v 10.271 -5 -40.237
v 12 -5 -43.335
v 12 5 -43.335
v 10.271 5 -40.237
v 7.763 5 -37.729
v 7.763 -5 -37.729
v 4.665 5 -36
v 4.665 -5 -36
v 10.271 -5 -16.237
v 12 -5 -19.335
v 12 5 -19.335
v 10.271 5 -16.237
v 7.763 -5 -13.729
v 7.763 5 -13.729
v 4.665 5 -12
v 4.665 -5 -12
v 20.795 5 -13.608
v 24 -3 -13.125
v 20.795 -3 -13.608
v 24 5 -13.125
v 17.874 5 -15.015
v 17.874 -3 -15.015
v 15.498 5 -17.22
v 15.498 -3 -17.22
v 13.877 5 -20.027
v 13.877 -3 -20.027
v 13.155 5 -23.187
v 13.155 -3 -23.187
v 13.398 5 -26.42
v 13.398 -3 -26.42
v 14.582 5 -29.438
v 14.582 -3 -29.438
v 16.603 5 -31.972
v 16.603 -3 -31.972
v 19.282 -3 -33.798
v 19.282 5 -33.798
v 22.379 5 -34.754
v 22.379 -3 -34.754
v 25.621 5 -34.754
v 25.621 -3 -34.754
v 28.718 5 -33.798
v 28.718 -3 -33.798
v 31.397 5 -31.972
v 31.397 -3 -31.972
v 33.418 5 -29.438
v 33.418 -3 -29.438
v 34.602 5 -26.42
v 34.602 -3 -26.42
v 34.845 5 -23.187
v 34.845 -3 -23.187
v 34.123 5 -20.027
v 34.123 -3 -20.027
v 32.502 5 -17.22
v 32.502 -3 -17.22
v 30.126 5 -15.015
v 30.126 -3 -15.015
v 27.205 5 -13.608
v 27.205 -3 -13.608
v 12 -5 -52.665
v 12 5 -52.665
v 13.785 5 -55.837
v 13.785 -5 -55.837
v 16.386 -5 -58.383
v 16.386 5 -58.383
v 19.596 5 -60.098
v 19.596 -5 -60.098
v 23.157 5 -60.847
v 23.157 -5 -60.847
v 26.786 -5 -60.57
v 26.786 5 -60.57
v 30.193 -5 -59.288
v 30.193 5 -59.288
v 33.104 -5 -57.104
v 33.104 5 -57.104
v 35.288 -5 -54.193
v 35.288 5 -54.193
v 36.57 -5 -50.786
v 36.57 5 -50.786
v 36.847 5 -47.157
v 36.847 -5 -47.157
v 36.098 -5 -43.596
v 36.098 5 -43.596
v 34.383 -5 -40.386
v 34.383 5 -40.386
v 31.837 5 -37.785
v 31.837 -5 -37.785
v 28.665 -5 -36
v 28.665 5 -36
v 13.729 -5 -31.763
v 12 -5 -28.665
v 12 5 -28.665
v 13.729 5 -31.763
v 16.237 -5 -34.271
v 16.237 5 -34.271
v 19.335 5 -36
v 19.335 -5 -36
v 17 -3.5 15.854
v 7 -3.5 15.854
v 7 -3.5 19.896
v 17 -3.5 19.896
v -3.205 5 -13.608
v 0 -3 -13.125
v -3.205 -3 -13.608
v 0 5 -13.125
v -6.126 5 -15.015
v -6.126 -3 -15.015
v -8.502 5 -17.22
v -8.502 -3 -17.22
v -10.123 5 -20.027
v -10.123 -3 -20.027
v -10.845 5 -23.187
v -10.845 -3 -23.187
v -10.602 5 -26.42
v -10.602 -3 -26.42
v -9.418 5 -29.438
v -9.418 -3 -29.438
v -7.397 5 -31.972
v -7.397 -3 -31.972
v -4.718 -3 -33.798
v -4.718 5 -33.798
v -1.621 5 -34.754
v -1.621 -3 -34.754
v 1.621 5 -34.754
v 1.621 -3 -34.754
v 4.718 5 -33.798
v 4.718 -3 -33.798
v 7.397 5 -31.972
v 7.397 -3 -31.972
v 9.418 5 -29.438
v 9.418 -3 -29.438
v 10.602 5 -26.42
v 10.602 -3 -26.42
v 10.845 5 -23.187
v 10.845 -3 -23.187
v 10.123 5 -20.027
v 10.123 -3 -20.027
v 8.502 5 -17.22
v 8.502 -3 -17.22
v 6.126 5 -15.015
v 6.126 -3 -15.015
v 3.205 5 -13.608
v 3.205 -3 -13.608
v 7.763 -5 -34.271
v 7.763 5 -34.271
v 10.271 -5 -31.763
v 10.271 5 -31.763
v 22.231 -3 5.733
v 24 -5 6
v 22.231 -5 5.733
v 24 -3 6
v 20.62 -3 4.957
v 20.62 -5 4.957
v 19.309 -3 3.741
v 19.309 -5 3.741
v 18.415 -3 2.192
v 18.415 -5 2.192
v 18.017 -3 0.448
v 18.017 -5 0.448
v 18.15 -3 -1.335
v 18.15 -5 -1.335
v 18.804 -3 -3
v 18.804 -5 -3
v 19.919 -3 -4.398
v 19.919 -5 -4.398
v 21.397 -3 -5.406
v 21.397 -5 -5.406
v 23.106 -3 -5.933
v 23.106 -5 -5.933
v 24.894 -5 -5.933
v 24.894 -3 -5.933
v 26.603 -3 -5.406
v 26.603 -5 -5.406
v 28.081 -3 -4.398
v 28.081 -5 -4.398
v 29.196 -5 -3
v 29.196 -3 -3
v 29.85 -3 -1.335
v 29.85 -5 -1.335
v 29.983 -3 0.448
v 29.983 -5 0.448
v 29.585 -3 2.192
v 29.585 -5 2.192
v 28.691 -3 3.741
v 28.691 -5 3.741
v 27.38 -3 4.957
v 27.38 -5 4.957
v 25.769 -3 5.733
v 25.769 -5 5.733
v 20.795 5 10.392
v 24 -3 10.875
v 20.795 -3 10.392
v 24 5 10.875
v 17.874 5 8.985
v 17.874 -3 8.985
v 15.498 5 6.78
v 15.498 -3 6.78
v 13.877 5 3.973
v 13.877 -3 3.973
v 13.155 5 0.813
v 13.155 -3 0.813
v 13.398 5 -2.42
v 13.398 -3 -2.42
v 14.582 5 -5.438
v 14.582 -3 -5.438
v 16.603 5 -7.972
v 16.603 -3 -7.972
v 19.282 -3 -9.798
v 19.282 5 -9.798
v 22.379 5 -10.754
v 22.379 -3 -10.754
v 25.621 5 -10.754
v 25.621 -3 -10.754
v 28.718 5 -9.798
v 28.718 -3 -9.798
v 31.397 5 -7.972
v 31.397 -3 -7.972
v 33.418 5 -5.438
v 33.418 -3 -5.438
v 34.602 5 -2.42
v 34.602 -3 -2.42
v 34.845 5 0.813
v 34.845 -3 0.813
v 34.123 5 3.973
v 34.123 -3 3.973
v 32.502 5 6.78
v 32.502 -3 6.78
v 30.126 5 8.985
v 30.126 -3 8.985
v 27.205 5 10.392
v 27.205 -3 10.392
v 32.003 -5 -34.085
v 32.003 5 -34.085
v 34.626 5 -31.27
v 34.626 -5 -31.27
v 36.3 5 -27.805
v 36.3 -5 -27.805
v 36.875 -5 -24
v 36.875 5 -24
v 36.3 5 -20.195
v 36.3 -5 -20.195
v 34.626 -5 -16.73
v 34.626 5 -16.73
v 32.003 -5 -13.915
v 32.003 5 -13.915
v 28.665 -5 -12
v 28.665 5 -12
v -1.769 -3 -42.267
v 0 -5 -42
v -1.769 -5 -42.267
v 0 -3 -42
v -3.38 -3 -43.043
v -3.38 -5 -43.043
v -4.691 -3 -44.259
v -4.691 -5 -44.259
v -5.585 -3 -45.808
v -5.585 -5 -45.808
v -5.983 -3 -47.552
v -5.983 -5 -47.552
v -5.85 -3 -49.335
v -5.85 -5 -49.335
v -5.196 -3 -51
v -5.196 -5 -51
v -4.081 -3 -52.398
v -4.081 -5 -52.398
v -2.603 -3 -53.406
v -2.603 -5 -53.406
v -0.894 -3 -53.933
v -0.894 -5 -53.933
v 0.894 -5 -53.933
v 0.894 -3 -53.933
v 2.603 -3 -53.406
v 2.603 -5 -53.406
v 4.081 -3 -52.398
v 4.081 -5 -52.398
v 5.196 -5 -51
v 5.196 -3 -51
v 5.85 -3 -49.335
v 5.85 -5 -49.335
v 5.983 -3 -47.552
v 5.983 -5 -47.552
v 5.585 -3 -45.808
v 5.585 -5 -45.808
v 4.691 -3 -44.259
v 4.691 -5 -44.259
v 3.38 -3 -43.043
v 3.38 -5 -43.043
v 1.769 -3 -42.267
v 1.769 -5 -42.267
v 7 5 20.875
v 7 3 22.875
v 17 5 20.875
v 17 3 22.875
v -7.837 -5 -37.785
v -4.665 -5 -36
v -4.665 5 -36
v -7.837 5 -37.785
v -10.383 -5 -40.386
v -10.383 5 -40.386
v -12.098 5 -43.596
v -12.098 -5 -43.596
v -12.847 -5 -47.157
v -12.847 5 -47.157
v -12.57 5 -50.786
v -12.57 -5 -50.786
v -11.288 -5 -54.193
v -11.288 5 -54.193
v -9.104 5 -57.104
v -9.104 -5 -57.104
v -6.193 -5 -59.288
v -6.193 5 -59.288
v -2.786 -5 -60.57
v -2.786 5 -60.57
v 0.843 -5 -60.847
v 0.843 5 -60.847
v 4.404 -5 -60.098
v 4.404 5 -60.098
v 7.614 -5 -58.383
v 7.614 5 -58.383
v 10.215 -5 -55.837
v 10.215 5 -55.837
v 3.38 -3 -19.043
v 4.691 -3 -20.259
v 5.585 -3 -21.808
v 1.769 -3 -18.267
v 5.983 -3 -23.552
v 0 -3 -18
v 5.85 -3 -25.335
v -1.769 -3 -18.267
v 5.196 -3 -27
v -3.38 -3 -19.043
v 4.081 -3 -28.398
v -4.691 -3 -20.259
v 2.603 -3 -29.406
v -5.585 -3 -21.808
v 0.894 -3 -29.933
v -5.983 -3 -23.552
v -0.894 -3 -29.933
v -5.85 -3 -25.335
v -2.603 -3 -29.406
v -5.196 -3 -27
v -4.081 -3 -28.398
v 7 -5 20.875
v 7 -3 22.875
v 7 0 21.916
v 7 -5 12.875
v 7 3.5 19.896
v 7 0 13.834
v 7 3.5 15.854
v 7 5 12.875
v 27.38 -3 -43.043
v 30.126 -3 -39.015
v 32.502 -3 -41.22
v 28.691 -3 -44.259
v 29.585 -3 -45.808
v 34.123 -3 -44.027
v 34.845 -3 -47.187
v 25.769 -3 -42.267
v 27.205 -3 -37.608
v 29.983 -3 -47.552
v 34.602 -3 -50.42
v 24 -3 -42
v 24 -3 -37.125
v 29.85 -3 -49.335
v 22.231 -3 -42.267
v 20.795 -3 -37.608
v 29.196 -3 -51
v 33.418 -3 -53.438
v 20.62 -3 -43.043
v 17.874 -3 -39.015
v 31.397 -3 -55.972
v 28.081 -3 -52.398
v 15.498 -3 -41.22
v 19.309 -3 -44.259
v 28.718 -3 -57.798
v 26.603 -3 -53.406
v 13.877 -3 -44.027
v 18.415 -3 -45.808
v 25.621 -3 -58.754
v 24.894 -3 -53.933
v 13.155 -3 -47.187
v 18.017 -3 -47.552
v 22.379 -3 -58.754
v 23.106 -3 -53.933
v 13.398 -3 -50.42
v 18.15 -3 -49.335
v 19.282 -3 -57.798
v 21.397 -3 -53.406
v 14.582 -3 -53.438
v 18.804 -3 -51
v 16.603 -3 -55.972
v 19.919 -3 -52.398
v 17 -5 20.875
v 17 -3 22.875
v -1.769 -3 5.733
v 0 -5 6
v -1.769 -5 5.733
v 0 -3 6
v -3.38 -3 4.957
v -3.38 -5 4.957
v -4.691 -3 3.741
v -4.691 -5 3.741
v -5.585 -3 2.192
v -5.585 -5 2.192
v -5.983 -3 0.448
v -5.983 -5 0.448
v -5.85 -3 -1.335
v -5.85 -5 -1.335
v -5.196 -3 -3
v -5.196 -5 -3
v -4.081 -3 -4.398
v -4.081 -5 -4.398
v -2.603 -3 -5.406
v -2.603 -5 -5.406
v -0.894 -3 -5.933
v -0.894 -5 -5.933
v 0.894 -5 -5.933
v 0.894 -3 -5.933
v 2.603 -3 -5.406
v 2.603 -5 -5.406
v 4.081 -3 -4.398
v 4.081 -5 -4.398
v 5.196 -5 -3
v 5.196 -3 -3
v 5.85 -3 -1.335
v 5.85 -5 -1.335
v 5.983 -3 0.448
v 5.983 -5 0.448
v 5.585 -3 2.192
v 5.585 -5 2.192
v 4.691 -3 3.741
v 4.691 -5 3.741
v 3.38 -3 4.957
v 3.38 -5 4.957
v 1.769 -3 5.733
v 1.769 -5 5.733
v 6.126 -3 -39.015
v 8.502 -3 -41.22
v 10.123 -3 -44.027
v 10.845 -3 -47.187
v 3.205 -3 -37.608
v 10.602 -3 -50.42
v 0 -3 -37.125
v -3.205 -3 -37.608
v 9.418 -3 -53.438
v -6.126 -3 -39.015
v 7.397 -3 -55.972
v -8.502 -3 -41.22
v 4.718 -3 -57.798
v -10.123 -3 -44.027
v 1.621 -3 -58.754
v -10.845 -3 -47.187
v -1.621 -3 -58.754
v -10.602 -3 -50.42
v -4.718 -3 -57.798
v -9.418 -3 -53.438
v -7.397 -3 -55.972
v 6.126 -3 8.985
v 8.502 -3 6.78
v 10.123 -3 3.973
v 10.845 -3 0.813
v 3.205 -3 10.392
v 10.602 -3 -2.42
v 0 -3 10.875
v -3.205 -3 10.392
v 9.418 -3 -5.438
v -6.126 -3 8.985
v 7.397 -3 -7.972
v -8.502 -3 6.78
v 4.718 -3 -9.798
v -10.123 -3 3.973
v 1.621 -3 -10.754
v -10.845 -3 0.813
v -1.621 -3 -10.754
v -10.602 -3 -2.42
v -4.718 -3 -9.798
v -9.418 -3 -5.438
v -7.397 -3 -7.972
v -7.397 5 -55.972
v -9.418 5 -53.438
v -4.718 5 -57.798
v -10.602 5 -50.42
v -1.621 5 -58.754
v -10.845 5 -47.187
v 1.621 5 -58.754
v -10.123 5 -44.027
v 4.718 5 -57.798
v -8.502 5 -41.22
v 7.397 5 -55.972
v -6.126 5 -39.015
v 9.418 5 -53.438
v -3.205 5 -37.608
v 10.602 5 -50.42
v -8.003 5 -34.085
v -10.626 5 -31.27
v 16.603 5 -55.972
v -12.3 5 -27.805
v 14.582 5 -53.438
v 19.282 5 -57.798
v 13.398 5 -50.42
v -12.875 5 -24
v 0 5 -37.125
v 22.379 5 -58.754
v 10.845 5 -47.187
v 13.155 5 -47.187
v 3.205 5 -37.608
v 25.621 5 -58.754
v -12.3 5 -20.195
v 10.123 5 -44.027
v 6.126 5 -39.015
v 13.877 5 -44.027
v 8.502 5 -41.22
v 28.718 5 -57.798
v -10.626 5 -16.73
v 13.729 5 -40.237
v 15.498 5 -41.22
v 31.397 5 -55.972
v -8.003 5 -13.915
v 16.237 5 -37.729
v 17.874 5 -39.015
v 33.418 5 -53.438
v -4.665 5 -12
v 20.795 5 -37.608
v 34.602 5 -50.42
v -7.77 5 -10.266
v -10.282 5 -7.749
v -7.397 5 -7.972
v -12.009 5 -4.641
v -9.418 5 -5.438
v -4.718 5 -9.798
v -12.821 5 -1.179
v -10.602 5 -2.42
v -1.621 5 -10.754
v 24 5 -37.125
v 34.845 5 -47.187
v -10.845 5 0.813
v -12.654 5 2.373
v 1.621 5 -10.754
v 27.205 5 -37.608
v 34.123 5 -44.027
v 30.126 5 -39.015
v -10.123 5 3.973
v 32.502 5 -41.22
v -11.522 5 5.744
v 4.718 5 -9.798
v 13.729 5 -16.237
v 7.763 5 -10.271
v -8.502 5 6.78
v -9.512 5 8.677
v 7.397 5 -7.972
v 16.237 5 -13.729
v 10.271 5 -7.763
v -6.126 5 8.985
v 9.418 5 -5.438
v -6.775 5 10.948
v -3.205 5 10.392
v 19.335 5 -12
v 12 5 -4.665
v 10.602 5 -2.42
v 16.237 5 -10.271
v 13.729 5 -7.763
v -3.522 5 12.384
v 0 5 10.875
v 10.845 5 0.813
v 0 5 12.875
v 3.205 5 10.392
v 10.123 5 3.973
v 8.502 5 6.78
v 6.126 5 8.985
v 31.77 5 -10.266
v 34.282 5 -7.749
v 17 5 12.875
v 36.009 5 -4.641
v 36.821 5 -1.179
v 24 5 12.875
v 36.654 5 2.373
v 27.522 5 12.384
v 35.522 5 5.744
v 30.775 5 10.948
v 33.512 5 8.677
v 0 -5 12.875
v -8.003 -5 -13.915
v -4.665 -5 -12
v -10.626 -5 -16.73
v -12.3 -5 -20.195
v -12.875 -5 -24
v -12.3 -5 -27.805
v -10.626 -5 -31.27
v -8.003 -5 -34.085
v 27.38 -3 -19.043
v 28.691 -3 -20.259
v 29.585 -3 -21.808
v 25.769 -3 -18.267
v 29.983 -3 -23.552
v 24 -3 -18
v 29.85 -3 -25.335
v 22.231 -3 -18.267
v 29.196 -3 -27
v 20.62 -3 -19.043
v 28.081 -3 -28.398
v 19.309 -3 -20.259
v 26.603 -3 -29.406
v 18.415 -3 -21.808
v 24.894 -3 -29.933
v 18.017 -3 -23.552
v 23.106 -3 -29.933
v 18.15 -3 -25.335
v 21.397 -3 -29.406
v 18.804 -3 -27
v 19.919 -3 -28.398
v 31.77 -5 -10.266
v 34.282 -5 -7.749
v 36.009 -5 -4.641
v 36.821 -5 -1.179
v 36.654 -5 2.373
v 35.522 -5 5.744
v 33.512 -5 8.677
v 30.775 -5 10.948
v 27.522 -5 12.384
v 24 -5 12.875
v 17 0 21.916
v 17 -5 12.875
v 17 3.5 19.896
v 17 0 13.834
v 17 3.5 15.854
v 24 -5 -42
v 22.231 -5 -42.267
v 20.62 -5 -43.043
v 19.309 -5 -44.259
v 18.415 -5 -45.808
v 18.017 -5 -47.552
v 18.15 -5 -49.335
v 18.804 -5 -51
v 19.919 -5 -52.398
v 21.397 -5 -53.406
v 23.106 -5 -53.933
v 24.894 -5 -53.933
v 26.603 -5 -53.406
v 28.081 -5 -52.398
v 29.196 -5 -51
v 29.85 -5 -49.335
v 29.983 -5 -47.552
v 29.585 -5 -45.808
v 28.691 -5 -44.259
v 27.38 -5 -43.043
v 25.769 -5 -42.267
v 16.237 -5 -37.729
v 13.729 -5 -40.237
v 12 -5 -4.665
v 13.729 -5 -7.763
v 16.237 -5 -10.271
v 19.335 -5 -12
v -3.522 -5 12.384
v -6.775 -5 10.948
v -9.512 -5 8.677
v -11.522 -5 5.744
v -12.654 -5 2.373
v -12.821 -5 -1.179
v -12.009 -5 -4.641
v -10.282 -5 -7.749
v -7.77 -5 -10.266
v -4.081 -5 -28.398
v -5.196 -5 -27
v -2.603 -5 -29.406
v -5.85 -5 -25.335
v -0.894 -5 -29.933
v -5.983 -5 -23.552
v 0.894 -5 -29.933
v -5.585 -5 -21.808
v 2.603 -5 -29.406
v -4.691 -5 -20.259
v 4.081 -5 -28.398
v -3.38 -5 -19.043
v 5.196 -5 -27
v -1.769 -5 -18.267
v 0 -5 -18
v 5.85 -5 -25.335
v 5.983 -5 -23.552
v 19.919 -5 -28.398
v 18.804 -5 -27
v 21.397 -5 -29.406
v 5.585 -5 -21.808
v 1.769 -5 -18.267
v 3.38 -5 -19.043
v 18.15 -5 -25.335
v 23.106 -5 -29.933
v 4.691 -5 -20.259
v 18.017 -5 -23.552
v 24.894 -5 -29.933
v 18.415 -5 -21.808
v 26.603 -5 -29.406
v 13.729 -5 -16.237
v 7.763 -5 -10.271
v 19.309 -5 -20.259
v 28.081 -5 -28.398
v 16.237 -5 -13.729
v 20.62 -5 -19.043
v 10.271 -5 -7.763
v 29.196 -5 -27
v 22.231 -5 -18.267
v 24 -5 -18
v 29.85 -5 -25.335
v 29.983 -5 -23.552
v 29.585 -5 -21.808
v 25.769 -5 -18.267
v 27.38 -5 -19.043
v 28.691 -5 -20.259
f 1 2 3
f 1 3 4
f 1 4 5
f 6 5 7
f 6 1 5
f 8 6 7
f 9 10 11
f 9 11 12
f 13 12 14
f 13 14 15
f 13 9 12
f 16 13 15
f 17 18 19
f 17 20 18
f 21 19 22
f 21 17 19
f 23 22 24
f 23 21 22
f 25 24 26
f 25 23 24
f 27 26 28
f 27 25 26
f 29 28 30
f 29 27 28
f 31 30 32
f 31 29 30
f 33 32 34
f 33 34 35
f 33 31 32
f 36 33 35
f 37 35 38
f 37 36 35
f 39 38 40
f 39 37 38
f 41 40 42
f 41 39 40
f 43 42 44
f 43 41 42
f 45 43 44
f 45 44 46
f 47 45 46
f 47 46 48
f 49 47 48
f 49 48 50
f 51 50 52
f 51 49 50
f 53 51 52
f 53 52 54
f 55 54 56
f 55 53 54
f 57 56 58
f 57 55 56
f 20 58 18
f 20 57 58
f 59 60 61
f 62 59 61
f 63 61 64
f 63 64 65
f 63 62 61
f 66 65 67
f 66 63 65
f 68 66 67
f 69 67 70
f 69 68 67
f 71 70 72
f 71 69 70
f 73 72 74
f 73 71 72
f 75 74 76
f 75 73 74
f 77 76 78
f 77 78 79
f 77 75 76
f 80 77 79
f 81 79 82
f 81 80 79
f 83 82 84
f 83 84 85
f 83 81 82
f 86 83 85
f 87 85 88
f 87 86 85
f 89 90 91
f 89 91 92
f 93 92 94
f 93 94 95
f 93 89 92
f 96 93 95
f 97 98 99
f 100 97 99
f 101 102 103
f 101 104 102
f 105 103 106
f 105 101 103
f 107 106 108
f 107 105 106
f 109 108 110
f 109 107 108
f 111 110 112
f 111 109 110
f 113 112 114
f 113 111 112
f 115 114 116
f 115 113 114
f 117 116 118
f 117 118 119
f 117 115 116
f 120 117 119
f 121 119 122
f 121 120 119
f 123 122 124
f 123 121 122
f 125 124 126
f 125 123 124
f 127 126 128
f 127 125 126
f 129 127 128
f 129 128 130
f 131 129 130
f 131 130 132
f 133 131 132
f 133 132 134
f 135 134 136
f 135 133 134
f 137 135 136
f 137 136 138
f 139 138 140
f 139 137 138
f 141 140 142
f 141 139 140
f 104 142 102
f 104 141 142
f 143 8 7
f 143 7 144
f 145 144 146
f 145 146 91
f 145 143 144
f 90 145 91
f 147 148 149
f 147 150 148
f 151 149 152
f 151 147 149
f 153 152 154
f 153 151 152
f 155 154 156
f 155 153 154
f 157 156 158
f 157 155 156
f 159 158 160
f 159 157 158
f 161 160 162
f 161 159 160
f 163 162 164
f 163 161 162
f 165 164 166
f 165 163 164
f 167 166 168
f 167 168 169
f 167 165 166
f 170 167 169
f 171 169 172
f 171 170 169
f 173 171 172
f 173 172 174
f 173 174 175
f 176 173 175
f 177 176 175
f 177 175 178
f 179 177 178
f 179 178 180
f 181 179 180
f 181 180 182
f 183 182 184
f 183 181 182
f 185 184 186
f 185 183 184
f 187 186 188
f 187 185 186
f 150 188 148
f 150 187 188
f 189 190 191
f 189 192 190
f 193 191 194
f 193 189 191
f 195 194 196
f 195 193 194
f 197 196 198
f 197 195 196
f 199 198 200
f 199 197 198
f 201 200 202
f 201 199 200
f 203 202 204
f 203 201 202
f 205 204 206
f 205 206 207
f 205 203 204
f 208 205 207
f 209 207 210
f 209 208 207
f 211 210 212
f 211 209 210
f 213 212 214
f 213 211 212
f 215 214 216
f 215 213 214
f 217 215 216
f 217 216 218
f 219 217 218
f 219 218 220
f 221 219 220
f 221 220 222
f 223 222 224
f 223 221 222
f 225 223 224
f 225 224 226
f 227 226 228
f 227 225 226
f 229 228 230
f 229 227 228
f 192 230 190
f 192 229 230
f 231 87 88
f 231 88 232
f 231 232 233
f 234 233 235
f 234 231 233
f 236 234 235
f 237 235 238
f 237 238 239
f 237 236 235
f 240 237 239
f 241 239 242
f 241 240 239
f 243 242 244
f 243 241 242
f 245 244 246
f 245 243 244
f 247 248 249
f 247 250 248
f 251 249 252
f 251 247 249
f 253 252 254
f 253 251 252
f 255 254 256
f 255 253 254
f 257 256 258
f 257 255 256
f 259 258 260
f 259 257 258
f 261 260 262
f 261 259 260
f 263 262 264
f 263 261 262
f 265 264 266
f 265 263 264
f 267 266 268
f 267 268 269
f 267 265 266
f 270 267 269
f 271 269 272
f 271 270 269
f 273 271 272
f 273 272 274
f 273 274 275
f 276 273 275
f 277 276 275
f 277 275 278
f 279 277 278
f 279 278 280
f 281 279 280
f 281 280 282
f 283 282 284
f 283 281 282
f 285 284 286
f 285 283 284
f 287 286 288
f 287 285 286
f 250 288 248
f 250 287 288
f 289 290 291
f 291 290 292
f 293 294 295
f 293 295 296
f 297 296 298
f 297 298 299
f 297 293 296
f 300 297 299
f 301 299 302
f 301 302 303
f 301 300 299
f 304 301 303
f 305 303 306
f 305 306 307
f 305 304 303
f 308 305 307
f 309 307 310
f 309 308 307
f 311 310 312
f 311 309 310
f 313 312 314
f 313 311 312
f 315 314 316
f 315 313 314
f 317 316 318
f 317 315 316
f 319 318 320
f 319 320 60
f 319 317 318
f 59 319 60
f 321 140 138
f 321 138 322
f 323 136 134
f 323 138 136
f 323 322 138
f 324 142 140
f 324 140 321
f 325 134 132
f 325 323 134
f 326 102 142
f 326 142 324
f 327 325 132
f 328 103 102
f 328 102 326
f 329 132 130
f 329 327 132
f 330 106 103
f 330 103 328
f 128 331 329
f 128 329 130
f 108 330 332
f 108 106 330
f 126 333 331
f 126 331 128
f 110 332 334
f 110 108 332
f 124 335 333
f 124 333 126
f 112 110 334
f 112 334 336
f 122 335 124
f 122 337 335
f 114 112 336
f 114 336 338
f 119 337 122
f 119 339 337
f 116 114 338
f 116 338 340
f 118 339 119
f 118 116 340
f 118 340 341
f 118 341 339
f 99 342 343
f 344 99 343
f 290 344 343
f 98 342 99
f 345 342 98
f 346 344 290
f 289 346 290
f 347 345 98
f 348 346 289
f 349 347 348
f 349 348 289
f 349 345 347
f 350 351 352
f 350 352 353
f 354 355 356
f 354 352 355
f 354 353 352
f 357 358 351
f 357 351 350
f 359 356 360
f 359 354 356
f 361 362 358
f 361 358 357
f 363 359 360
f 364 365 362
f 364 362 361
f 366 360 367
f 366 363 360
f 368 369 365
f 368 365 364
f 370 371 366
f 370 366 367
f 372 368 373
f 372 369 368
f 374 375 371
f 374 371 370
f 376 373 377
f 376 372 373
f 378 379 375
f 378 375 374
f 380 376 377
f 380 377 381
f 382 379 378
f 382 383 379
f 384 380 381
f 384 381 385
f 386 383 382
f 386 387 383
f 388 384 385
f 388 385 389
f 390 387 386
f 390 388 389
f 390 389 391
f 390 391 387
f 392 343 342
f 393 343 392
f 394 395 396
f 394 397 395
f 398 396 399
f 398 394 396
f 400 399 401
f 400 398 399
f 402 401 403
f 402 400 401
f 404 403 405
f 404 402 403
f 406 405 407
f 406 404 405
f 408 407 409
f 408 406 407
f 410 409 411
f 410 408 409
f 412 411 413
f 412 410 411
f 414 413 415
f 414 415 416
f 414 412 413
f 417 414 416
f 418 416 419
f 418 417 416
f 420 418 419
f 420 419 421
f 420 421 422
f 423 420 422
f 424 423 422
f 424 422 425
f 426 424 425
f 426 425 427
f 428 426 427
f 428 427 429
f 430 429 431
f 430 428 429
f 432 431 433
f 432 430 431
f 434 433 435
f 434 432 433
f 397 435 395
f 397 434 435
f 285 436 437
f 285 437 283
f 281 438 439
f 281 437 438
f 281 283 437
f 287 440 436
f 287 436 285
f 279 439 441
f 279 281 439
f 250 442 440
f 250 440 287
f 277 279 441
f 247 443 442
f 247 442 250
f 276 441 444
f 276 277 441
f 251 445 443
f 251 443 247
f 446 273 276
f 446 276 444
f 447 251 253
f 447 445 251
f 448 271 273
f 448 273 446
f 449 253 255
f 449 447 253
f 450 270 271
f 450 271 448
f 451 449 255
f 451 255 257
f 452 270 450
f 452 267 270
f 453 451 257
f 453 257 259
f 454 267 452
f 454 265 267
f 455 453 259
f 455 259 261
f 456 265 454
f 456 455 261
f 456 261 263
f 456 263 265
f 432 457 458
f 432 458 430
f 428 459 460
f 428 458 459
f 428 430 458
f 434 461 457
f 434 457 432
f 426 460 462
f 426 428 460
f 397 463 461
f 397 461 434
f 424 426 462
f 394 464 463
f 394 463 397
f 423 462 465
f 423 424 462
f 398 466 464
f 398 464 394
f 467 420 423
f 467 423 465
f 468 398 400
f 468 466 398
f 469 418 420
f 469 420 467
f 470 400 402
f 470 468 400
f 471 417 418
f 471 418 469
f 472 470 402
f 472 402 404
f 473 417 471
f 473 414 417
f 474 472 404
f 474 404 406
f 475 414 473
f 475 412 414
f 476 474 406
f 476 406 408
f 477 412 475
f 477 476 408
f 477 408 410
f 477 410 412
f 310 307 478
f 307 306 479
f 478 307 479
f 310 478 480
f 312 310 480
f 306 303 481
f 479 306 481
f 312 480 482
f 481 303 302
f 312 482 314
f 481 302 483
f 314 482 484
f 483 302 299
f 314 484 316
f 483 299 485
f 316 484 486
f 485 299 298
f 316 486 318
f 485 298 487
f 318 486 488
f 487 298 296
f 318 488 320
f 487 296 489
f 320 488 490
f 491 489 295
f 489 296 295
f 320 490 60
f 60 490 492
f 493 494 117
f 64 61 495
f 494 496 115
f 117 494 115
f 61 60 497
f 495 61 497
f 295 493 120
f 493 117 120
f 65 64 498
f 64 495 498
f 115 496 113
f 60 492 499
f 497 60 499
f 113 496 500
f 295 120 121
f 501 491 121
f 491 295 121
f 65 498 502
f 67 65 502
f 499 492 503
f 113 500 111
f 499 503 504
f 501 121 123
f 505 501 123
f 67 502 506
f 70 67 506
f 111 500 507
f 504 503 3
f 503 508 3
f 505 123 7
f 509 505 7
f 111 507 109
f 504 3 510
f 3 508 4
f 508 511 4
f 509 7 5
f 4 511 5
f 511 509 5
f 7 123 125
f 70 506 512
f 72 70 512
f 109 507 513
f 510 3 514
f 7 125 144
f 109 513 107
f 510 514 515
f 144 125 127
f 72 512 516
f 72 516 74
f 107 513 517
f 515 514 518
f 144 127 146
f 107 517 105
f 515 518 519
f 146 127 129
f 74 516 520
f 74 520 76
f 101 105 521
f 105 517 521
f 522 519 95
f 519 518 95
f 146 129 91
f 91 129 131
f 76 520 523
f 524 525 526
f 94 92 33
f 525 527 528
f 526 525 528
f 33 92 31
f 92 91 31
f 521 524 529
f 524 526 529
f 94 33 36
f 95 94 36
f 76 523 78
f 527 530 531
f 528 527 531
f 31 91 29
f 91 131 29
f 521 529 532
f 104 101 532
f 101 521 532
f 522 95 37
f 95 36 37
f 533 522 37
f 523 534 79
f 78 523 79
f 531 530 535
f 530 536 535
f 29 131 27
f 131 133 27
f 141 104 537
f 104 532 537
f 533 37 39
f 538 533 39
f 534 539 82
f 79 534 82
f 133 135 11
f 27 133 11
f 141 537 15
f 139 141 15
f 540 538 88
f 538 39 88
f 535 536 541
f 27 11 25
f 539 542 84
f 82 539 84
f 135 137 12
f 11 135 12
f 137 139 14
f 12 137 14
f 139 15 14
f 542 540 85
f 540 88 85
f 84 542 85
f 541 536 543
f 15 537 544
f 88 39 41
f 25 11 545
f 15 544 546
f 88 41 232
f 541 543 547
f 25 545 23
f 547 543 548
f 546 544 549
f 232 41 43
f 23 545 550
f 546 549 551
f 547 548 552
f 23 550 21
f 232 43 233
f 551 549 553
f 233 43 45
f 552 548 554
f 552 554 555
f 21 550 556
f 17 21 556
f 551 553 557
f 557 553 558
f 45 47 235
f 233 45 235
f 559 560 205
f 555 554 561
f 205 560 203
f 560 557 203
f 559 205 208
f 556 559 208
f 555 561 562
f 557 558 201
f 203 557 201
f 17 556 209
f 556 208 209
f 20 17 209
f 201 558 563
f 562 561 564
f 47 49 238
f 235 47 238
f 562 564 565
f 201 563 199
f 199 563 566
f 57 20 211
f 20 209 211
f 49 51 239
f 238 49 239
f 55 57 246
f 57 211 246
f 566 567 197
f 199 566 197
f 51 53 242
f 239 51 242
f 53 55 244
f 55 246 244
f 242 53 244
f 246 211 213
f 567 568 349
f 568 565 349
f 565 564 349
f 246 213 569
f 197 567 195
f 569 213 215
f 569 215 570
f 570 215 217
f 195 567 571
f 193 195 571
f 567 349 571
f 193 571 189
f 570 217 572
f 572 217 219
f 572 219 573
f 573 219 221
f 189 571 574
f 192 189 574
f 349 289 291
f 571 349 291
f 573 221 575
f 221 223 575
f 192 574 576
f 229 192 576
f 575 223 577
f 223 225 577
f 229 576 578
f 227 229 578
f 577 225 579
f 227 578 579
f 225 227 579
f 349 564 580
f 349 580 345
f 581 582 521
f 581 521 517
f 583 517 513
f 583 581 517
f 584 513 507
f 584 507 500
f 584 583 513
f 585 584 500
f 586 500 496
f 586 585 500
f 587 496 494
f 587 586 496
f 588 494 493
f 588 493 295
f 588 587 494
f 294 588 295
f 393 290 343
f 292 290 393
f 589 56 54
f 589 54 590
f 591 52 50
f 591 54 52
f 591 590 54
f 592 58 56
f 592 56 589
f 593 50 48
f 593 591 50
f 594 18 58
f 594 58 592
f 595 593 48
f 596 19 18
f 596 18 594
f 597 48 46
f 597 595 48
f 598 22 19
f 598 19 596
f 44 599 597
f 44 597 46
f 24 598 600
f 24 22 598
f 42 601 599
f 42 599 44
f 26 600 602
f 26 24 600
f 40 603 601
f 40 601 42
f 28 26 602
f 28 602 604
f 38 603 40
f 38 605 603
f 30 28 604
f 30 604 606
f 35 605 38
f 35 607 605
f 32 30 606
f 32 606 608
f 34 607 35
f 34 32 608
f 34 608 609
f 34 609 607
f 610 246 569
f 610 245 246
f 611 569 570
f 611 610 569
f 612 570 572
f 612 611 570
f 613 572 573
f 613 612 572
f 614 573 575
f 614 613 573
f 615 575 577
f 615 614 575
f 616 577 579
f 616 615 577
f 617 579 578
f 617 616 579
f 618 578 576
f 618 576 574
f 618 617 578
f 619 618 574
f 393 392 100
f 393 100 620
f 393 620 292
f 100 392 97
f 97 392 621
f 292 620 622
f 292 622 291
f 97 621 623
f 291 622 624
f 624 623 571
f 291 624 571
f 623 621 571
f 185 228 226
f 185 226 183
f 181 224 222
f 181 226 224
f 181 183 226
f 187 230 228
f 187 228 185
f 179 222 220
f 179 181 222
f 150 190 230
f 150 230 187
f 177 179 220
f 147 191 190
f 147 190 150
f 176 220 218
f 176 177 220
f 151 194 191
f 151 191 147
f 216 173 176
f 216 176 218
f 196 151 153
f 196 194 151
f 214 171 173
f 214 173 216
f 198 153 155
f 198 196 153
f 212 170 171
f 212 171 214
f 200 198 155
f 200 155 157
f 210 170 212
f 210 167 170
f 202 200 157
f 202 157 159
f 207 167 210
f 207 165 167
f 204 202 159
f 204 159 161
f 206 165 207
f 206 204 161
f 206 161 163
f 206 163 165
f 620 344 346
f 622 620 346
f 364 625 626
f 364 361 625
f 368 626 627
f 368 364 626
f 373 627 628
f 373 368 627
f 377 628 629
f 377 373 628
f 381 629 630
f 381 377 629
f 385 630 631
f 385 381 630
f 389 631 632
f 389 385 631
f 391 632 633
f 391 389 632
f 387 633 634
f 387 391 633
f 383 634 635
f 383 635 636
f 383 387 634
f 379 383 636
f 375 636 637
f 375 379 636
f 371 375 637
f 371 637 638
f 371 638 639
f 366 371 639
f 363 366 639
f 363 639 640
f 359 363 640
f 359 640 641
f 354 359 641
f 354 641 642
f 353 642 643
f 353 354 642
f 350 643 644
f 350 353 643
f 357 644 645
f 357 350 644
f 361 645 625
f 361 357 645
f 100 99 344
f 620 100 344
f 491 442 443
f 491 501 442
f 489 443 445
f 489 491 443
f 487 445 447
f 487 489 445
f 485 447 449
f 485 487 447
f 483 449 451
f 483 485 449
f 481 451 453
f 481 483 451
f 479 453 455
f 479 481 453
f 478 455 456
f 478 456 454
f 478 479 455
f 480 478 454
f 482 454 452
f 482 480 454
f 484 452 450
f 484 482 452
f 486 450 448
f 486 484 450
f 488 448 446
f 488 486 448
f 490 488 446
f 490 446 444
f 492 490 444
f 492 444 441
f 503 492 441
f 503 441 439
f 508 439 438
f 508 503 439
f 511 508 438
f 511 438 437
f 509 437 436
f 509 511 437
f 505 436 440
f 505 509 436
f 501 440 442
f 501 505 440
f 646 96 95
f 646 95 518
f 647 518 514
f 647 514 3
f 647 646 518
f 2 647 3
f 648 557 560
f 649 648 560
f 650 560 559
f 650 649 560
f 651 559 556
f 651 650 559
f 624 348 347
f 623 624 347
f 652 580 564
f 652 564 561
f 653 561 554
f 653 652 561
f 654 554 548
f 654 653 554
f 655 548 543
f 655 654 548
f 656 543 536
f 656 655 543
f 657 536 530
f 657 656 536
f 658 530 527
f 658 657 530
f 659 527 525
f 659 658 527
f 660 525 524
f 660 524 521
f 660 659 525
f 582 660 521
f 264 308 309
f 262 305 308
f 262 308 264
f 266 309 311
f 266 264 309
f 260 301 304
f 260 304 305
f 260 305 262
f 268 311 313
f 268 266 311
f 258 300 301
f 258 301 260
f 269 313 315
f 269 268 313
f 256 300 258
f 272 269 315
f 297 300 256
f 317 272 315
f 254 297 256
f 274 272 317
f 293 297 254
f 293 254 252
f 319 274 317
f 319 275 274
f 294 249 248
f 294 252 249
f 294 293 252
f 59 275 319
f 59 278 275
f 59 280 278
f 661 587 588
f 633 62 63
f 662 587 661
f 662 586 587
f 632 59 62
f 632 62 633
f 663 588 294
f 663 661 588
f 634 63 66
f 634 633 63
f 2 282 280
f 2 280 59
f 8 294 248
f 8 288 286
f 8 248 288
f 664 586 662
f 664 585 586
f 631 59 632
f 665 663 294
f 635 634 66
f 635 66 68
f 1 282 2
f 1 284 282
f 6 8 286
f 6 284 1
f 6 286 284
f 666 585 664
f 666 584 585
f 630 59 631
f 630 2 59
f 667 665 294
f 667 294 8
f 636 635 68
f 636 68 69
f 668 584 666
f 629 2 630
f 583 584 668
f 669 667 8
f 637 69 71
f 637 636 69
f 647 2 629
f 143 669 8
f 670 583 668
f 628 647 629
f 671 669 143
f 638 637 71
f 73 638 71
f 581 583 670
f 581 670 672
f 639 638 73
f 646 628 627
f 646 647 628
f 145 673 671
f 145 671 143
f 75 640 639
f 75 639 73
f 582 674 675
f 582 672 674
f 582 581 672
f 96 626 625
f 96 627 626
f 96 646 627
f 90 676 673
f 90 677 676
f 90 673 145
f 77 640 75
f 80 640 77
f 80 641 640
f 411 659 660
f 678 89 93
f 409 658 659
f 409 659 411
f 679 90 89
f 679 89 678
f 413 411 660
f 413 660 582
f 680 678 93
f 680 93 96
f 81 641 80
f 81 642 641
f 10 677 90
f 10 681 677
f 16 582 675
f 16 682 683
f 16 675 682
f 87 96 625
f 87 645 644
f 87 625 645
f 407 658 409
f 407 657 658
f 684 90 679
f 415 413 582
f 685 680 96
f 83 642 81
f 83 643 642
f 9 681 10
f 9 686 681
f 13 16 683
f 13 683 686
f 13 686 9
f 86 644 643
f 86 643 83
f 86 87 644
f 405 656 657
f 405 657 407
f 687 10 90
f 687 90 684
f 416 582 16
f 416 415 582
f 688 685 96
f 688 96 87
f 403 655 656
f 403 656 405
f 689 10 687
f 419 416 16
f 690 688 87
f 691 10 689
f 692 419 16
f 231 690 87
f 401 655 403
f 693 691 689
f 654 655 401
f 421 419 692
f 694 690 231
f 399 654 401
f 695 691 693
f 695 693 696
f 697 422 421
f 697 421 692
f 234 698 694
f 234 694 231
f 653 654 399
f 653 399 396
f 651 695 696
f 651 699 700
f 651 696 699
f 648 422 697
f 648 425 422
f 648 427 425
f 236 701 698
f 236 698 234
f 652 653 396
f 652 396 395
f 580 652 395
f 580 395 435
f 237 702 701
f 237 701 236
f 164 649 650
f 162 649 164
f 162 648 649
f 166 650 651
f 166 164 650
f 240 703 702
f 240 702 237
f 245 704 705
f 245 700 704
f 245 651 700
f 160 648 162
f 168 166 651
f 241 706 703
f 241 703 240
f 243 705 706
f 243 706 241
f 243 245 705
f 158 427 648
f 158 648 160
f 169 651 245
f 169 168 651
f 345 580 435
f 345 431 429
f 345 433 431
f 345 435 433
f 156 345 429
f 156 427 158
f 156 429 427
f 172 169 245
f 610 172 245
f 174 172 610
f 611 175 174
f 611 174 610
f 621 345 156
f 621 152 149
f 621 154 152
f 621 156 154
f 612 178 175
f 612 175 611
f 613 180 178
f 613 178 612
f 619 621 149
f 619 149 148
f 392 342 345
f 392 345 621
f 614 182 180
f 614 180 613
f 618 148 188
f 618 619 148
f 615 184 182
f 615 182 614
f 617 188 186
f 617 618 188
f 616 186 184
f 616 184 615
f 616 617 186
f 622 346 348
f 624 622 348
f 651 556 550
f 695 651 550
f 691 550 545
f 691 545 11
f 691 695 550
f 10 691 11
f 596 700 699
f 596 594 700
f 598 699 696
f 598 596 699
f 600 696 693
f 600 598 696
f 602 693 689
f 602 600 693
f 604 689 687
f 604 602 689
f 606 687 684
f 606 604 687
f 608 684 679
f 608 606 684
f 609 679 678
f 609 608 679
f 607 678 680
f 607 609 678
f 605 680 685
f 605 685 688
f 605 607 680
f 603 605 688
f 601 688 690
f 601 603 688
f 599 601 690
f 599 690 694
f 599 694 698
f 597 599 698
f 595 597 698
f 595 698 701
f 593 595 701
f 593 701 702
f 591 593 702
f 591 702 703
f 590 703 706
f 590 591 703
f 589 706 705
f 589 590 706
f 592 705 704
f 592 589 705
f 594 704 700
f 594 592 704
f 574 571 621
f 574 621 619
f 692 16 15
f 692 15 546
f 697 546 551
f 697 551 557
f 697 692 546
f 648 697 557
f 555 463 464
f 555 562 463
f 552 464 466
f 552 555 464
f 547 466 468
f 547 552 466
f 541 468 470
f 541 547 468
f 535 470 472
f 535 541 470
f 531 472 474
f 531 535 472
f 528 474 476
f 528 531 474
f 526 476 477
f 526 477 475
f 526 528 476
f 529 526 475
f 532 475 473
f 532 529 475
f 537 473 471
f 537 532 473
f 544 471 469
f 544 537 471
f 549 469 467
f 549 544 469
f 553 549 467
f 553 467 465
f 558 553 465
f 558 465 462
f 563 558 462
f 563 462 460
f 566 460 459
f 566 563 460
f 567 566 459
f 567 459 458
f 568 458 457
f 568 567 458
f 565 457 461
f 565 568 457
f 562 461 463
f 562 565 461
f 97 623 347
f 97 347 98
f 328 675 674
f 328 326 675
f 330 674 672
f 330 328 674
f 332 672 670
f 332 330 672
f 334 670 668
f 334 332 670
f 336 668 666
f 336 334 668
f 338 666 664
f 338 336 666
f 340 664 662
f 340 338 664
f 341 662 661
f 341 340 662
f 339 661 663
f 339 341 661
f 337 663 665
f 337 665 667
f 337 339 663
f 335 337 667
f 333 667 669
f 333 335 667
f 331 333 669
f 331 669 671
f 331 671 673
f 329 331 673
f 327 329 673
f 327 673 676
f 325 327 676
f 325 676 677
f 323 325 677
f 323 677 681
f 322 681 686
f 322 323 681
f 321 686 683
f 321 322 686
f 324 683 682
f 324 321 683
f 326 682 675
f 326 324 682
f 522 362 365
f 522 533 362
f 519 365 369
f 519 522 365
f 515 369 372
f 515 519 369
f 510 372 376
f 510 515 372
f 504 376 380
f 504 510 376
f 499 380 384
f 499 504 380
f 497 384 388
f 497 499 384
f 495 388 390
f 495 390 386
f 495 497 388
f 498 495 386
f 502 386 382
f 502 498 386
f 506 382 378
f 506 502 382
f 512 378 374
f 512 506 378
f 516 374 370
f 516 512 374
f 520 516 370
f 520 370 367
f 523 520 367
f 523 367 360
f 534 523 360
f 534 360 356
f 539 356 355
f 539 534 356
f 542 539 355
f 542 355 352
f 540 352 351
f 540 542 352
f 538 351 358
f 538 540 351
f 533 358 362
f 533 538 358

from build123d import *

# Parameters (mm, degrees)
LPATTERN1_COUNT     = 3
LPATTERN1_PITCH     = 24
LPATTERN2_COUNT     = 2
LPATTERN2_PITCH     = 24
BOSS_EXTRUDE1_REACH = 84.606
SKETCH4_W           = 24
SKETCH4_H           = 10
SKETCH5_W           = 10
SKETCH5_H           = 10
BOSS_EXTRUDE2_DEPTH = 10
CUT_EXTRUDE1_DEPTH  = 10
CHAMFER3_SIZE       = 2


with BuildPart() as part:
    # Sketch1 → Revolve1 (revolve)
    with BuildSketch(Plane(origin=(0, 0, 0), x_dir=(0, 0, -1), z_dir=(1, 0, 0))):
        Polygon((-12.875, 5), (-12.875, -5), (-6, -5), (-6, -3), (-10.875, -3), (-10.875, 5), align=None)
    revolve1 = revolve(axis=Axis((0, 27.077205882, 0), (0, -1, 0)))

    # LPattern1: Revolve1 ×3
    with Locations(*[(0, 0, -i * LPATTERN1_PITCH) for i in range(1, LPATTERN1_COUNT)]):
        add(revolve1)

    # LPattern2: Revolve1 ×2
    with Locations(*[(i * LPATTERN2_PITCH, 0, 0) for i in range(1, LPATTERN2_COUNT)]):
        add(revolve1)

    # LPattern2 copy 1 sketch → LPattern2 copy 1 (revolve)
    with BuildSketch(Plane(origin=(24, 0, -24), x_dir=(0, 0, -1), z_dir=(1, 0, 0))):
        Polygon((-12.875, 5), (-12.875, -5), (-6, -5), (-6, -3), (-10.875, -3), (-10.875, 5), align=None)
    revolve(axis=Axis((24, 27.077205882, -24), (0, -1, 0)))

    # LPattern2 copy 2 sketch → LPattern2 copy 2 (revolve)
    with BuildSketch(Plane(origin=(24, 0, -48), x_dir=(0, 0, -1), z_dir=(1, 0, 0))):
        Polygon((-12.875, 5), (-12.875, -5), (-6, -5), (-6, -3), (-10.875, -3), (-10.875, 5), align=None)
    revolve(axis=Axis((24, 27.077205882, -48), (0, -1, 0)))

    # Sketch4 → Boss-Extrude1 (add, up to next)
    with BuildSketch(Plane.XY.offset(12.875), mode=Mode.PRIVATE) as boss_extrude1_sk1:
        with Locations((12, 0)):
            Rectangle(SKETCH4_W, SKETCH4_H)
    boss_extrude1_tool1 = extrude(boss_extrude1_sk1.sketch, amount=-BOSS_EXTRUDE1_REACH, mode=Mode.PRIVATE) - part.part
    add(boss_extrude1_tool1.solids().sort_by_distance((12, 0, 12.875))[0])

    # Sketch5 → Boss-Extrude2 (add)
    with BuildSketch(Plane.XY.offset(12.875)):
        with Locations((12, 0)):
            Rectangle(SKETCH5_W, SKETCH5_H)
    extrude(amount=BOSS_EXTRUDE2_DEPTH)

    # Sketch8 → Cut-Extrude1 (cut)
    with BuildSketch(Plane.ZY.offset(-7)):
        Polygon((19.895725942, -3.5), (21.916451884, 0), (19.895725942, 3.5), (15.854274058, 3.5), (13.833548116, 0), (15.854274058, -3.5), align=None)
    extrude(amount=-CUT_EXTRUDE1_DEPTH, mode=Mode.SUBTRACT)

    # Chamfer3
    chamfer3_edges = [part.edges().sort_by_distance(p)[0] for p in [
        (12, -5, 22.875),
        (12, 5, 22.875),
    ]]
    chamfer(chamfer3_edges, length=CHAMFER3_SIZE)


solid = part.part
